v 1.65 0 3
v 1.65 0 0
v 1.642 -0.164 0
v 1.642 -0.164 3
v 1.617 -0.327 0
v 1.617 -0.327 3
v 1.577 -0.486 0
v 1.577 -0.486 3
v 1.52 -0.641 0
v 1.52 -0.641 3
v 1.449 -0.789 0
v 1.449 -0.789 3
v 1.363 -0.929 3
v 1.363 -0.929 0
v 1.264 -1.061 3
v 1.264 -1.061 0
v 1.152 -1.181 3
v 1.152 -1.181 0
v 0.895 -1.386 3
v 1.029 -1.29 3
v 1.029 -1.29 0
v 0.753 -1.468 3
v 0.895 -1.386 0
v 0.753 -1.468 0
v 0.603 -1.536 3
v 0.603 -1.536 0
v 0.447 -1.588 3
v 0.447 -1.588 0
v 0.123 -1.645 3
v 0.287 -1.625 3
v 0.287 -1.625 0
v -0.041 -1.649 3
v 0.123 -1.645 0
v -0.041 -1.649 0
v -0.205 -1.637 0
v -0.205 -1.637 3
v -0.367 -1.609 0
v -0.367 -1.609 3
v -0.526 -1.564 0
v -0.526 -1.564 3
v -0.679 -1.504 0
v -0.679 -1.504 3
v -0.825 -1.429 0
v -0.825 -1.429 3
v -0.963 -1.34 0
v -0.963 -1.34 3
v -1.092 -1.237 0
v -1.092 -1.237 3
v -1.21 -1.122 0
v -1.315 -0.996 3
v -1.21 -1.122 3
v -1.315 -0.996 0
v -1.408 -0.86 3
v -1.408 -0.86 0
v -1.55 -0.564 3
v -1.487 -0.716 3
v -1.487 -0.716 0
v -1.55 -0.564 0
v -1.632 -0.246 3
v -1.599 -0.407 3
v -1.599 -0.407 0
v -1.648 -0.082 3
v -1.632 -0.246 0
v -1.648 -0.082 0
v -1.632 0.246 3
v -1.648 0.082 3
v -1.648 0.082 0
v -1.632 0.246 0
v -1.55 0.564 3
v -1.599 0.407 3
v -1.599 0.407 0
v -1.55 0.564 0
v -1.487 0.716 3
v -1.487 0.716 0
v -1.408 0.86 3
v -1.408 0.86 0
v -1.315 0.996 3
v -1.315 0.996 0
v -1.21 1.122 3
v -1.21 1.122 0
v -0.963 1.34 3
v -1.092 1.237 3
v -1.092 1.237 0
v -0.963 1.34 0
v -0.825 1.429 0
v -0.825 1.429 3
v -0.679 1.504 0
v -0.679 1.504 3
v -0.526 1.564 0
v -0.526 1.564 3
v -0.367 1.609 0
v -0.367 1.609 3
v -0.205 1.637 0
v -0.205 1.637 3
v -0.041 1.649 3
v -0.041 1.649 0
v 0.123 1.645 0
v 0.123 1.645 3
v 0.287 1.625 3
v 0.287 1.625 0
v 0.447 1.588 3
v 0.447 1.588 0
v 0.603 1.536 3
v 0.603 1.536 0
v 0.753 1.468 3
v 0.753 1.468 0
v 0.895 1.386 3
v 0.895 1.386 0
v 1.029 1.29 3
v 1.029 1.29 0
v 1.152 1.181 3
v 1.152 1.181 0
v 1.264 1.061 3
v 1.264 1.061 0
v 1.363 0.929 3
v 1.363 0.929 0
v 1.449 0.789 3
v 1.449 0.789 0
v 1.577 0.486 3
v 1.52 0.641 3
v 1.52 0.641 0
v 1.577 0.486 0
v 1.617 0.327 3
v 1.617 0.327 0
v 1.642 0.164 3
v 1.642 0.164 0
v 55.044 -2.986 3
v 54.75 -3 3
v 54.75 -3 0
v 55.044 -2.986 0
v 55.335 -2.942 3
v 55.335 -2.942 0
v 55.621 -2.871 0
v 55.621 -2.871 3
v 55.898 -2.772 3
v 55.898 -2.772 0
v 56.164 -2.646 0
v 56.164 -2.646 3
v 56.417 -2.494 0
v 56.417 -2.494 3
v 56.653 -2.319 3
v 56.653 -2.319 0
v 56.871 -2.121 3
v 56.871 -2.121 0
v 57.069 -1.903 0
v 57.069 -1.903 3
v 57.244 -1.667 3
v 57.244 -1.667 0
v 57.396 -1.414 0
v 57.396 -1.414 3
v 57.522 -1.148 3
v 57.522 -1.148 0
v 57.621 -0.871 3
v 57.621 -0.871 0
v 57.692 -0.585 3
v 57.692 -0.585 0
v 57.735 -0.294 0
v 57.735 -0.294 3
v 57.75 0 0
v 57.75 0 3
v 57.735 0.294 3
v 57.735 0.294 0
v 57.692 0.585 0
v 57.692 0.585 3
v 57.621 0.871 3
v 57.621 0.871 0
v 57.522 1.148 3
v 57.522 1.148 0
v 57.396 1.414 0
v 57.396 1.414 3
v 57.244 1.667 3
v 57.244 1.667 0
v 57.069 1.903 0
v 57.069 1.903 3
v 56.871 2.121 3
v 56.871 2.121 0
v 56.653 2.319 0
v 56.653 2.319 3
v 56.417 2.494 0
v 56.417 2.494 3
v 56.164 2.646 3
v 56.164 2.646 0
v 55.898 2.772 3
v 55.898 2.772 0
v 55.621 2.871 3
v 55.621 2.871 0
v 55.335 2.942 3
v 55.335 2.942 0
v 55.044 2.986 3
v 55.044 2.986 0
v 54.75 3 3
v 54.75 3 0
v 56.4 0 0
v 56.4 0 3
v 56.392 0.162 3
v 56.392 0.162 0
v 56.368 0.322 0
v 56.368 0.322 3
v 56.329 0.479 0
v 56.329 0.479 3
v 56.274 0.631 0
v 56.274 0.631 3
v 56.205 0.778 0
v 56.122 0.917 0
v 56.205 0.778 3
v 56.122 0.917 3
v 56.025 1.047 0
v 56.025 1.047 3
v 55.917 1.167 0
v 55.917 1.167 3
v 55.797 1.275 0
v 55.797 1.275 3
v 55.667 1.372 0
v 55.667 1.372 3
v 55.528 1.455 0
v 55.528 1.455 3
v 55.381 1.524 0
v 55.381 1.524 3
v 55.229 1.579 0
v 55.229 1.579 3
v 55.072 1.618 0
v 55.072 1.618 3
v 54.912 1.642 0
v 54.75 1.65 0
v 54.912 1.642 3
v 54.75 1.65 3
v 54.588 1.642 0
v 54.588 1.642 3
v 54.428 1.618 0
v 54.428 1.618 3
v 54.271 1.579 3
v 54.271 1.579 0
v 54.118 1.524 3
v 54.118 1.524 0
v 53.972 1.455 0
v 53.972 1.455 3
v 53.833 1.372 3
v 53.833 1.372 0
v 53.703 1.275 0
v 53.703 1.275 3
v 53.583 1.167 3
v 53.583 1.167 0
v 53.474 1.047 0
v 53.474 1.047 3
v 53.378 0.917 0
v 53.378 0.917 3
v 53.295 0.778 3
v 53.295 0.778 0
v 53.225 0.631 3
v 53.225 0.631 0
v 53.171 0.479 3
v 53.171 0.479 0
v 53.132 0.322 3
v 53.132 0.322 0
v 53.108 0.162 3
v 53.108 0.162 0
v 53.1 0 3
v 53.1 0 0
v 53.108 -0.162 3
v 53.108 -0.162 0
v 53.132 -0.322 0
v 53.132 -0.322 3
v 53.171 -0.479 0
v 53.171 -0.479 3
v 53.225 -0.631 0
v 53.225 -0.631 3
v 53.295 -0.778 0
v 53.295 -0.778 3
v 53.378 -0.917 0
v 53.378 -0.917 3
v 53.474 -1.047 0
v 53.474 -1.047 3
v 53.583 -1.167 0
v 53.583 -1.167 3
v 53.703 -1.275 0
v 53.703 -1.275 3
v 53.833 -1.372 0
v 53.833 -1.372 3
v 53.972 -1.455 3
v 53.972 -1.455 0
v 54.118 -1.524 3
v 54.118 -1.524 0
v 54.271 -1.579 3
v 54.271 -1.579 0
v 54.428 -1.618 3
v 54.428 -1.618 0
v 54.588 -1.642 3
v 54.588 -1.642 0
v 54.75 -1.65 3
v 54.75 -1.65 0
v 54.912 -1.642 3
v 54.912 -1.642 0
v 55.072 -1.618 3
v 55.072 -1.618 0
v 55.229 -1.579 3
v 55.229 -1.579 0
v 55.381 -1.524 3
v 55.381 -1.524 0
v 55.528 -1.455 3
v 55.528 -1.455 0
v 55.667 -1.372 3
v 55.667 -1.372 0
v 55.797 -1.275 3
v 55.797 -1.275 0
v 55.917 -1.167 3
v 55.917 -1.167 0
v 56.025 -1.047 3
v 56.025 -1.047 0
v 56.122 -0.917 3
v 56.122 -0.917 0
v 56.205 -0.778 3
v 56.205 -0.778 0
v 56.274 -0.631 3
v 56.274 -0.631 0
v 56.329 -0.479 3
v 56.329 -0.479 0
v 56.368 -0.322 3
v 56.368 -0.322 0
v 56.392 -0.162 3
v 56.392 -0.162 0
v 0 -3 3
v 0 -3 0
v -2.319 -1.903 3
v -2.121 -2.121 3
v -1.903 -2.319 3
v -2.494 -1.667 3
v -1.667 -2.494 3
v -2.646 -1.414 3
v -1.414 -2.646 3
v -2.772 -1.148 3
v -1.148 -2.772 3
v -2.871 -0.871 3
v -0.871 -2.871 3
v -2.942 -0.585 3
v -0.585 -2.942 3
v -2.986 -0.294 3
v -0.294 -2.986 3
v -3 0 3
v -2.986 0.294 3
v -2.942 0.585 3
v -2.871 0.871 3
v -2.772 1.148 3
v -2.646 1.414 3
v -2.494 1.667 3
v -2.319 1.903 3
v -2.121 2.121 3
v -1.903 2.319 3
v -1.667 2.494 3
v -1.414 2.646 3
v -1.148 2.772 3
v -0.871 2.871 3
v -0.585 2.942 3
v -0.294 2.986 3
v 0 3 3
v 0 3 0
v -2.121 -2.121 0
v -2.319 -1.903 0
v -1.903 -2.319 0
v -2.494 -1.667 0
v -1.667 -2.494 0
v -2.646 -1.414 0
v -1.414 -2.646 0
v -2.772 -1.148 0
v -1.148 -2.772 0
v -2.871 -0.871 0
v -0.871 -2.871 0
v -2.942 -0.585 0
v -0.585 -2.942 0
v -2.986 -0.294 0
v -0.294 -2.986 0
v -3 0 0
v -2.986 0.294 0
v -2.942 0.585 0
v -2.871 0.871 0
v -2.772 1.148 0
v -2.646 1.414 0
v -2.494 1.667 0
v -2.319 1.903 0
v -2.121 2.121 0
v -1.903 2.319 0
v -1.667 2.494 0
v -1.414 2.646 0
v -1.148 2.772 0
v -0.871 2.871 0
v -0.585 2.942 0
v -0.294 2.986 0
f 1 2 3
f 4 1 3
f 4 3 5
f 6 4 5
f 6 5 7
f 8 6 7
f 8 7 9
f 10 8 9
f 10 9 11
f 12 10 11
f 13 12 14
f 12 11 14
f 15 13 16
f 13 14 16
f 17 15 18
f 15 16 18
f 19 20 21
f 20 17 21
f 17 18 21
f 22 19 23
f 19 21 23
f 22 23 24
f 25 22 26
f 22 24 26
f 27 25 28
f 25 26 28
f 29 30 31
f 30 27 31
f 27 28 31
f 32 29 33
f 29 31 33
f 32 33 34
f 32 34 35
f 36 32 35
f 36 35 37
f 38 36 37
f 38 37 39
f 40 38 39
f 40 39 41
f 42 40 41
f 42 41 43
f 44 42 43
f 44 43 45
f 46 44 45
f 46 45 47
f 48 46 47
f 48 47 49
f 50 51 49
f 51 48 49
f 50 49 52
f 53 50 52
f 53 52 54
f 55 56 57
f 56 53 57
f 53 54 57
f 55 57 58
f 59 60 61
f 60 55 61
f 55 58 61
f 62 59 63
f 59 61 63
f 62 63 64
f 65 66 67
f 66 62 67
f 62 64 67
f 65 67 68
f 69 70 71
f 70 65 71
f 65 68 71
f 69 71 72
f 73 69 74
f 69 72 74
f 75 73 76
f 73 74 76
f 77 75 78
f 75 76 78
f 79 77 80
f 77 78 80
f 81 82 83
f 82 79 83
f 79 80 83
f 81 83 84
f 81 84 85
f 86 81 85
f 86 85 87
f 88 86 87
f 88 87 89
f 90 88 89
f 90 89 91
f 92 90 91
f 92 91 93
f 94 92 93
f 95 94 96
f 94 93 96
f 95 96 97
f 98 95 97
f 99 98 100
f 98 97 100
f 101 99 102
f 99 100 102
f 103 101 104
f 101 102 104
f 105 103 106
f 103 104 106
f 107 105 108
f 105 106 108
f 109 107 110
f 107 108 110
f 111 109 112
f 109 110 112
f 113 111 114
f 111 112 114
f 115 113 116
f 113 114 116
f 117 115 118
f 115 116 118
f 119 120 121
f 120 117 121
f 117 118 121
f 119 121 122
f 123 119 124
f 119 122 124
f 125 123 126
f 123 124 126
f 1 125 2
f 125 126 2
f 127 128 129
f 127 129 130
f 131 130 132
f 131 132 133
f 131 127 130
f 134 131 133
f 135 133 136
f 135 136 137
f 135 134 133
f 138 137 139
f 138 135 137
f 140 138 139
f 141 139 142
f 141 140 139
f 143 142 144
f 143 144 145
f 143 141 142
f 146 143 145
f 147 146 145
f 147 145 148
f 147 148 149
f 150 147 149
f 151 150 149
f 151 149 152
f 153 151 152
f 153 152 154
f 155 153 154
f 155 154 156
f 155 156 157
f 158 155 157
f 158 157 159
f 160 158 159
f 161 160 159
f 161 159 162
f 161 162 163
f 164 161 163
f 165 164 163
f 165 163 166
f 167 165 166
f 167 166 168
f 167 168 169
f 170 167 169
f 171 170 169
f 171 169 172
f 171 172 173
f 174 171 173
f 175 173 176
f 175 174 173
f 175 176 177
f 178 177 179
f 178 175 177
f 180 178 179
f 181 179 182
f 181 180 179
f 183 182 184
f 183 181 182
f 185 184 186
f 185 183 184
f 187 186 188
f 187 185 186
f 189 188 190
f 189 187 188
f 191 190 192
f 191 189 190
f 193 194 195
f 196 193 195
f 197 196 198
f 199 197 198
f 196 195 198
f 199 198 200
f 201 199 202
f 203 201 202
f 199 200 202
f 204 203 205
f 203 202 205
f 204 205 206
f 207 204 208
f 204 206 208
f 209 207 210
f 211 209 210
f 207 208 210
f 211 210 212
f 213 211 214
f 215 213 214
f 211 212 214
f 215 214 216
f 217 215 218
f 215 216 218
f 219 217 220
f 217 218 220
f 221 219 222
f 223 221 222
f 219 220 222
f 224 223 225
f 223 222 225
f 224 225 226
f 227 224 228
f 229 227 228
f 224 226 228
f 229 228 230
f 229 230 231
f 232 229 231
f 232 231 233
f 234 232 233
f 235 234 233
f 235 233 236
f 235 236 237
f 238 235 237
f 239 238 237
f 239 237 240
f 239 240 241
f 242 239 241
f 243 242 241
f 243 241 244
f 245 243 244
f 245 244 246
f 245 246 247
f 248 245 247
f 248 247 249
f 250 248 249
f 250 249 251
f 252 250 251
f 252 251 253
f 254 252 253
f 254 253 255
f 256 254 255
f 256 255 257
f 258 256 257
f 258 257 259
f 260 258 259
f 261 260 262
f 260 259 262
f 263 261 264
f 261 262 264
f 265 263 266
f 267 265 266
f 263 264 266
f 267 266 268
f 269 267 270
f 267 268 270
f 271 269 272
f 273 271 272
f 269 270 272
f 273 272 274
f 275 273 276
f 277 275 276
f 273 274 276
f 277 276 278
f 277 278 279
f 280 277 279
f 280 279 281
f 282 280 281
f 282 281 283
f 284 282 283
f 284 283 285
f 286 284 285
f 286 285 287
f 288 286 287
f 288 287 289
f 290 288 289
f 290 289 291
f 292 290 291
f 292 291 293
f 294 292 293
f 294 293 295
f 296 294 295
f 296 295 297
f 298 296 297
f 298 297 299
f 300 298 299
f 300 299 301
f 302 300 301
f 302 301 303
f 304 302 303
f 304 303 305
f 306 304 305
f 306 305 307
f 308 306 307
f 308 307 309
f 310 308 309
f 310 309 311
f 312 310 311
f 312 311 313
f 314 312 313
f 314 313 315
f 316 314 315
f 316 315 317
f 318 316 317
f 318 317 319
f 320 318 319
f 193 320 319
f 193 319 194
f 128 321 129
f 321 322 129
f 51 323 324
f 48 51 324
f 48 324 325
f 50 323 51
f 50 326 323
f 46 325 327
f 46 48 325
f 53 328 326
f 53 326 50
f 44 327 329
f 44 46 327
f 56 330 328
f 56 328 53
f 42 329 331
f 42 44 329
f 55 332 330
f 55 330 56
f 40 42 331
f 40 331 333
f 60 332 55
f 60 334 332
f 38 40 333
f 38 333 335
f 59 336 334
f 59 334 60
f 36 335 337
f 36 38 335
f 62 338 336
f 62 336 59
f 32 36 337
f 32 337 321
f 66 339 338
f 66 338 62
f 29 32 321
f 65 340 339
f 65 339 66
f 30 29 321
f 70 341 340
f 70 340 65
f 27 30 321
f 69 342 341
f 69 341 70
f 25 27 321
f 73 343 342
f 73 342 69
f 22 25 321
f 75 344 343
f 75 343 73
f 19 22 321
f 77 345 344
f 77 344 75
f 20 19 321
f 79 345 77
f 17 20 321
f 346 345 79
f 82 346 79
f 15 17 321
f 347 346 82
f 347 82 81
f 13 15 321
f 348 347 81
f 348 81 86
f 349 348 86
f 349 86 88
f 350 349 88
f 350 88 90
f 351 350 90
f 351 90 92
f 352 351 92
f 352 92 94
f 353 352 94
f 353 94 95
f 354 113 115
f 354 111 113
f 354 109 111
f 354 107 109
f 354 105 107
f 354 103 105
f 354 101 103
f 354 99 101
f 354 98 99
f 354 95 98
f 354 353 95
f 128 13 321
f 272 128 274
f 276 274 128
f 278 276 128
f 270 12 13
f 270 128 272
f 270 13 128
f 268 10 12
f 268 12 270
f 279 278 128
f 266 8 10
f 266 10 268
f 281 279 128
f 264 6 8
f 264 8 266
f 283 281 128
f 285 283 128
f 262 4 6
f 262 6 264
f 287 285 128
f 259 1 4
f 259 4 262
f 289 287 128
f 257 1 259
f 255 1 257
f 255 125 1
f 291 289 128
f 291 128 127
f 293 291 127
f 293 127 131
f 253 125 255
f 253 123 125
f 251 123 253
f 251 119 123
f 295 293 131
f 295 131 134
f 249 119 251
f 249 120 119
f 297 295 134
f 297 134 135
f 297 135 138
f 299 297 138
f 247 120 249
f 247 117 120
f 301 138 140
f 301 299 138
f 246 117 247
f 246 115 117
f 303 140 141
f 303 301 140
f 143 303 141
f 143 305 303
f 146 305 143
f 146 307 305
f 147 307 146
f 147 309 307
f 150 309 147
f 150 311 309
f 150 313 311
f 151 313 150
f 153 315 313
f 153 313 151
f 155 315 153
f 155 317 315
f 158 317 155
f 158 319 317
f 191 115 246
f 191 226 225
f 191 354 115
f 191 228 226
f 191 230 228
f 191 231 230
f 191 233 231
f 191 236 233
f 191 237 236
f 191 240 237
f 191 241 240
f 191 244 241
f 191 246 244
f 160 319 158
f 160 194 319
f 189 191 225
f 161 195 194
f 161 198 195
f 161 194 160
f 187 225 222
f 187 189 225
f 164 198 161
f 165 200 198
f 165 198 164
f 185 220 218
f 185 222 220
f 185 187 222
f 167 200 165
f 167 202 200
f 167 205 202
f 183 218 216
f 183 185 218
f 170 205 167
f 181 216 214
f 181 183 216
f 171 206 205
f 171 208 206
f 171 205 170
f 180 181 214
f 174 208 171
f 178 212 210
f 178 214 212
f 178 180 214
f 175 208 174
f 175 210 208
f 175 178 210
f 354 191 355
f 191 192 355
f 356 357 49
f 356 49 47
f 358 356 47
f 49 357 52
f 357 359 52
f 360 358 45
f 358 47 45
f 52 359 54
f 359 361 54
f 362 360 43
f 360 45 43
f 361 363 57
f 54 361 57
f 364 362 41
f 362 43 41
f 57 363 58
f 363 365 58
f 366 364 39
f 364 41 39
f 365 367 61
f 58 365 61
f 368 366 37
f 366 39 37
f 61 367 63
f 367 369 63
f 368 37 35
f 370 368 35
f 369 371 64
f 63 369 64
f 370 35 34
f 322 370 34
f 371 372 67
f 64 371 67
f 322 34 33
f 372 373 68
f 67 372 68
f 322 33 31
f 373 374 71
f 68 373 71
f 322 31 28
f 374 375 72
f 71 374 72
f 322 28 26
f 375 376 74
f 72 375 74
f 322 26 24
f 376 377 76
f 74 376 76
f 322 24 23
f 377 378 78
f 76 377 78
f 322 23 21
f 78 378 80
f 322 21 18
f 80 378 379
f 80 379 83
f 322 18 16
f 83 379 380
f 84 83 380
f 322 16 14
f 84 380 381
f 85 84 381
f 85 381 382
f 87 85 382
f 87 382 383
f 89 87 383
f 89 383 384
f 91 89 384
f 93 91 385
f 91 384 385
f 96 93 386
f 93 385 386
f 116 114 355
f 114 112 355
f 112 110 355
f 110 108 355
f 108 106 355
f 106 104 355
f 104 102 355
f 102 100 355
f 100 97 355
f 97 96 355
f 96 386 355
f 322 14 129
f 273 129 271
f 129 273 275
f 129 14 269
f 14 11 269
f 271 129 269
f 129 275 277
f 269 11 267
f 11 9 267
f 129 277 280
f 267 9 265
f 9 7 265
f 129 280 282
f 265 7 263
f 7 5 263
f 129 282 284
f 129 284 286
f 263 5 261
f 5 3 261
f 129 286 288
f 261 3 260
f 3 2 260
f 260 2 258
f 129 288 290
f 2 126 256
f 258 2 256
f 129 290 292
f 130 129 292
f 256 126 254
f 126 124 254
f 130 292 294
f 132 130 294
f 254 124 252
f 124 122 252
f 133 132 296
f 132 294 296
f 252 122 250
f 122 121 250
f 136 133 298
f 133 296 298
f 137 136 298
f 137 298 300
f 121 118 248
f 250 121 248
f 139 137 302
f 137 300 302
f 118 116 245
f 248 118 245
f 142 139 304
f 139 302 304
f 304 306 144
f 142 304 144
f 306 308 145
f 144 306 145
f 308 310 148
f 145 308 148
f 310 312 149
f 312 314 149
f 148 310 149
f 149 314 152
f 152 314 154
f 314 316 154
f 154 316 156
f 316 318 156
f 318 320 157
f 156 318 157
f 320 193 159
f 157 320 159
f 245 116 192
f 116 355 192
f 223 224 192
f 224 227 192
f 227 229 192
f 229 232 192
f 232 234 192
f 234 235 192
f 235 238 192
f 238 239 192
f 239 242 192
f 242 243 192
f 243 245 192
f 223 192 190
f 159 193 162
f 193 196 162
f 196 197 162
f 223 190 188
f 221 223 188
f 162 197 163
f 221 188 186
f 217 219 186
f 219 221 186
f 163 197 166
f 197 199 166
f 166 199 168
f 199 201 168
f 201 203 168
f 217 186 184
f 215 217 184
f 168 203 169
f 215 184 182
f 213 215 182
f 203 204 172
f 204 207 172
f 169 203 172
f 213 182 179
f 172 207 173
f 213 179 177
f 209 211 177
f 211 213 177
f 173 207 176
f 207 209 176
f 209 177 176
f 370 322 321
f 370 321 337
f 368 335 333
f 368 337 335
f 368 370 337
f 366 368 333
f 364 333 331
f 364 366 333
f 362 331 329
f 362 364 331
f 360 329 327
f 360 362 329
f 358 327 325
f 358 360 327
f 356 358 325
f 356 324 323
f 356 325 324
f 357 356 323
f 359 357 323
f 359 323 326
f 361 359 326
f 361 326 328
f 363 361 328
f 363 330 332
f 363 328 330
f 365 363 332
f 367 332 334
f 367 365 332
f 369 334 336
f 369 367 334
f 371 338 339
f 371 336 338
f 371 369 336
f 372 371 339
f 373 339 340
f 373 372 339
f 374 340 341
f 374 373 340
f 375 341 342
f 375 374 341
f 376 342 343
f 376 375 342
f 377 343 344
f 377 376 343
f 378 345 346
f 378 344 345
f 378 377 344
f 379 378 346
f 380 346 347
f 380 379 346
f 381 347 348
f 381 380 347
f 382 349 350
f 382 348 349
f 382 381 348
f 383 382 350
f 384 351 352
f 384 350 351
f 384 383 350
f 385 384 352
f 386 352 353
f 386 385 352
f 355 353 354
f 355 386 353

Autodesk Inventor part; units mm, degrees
ref_plane "YZ Plane" through (0, 0, 0) normal (1, 0, 0) x (0, 1, 0)
ref_plane "XZ Plane" through (0, 0, 0) normal (0, 1, 0) x (-1, 0, 0)
ref_plane "XY Plane" through (0, 0, 0) normal (0, 0, 1) x (1, 0, 0)
sketch "Sketch1" plane through (0, 0, 0) normal (0, 0, 1) x (1, 0, 0)
  line L0 (0, 0) -> (24, 0)
  circle A0 centre (0, 0) radius 1.6
  line L1 (0, 0) -> (24, 0) construction
  line L2 (0, -3) -> (24, -3)
  line L3 (24, 3) -> (0, 3)
  arc A1 (0, 3) -> (0, -3) centre (0, 0) ccw
  line L4 (24, 0) -> (28, 0)
  circle A2 centre (27, 0) radius 1.6
  line L5 (27, 0) -> (0, 0) construction
  line L6 (27, 3) -> (0, 3)
  line L7 (0, -3) -> (27, -3)
  arc A3 (27, -3) -> (27, 3) centre (27, 0) ccw
  arc A4 (0, 3) -> (0, -3) centre (0, 0) ccw
  point P0 (12, 0)
  point P1 (13.5, 0)
  dimension "d0" = 24
  dimension "d1" = 3.2
  dimension "d6" = 4
  dimension "d7" = 3.2
  dimension "d8" = 6
extrude "Extrusion1" [suppressed]
sketch "Sketch2" plane through (0, 0, 0) normal (0, 0, 1) x (1, 0, 0)
  line L0 (0, 0) -> (28, 0)
  circle A0 centre (0, 0) radius 1.65
  circle A1 centre (28, 0) radius 1.65
  line L1 (0, 0) -> (28, 0) construction
  line L2 (0, -3) -> (28, -3)
  line L3 (28, 3) -> (0, 3)
  arc A2 (0, 3) -> (0, -3) centre (0, 0) ccw
  arc A3 (28, -3) -> (28, 3) centre (28, 0) ccw
  point P0 (14, 0)
  dimension "d9" = 28
  dimension "d10" = 3.3
  dimension "d11" = 3.3
  dimension "d12" = 6
extrude "Extrusion2" add sketch "Sketch2" along normal blind 3
sketch "Sketch3" plane through (0, 0, 3) normal (0, 0, 1) x (1, 0, 0)
  circle A0 centre (28, 0) radius 1.65 projected
  line L0 (28, 0) -> (43, 0)
  line L1 (28, 0) -> (43, 0) construction
  line L2 (28, -3) -> (43, -3)
  line L3 (43, 3) -> (28, 3)
  arc A1 (28, 3) -> (28, -3) centre (28, 0) ccw
  arc A2 (43, -3) -> (43, 3) centre (43, 0) ccw
  circle A3 centre (43, 0) radius 1.65
  point P0 (0, 0)
  point P1 (35.5, 0)
  dimension "d15" = 15
  dimension "d16" = 6
extrude "Extrusion3" add sketch "Sketch3" against normal blind 3 contours A0 | A1 L3 A2 L2
sketch "Sketch4" plane through (0, 0, 3) normal (0, 0, 1) x (1, 0, 0)
  line L0 (38.0198, 0) -> (46.7499, 0)
  circle A0 centre (46.7499, 0) radius 1.65
  line L1 (0, 0) -> (46.7499, 0) construction
  line L2 (0, -3) -> (46.7499, -3)
  line L3 (46.7499, 3) -> (0, 3)
  arc A1 (0, 3) -> (0, -3) centre (0, 0) ccw
  arc A2 (46.7499, -3) -> (46.7499, 3) centre (46.7499, 0) ccw
  line L4 (39.9731, -3) -> (39.9731, 3)
  point P0 (23.375, 0)
  dimension "d19" = 3.3
  dimension "d20" = 6
extrude "Extrusion4" add sketch "Sketch4" against normal blind 3 contours L4 L3 A2 L2
extrude "Extrusion5" cut sketch "Sketch4" against normal blind 3 contours A0
sketch "Sketch5" plane through (0, 0, 3) normal (0, 0, 1) x (1, 0, 0)
  arc A0 (46.7499, -3) -> (46.7499, 3) centre (46.7499, 0) ccw projected
  line L0 (46.7499, 0) -> (54.7499, 0)
  circle A1 centre (54.7499, 0) radius 1.65
  line L1 (33.9937, 0) -> (54.7499, 0) construction
  line L2 (33.9937, 3) -> (54.7499, 3)
  line L3 (54.7499, -3) -> (33.9937, -3)
  arc A2 (33.9937, 3) -> (33.9937, -3) centre (33.9937, 0) ccw
  arc A3 (54.7499, -3) -> (54.7499, 3) centre (54.7499, 0) ccw
  point P0 (0, 0)
  point P1 (44.3718, 0)
  dimension "d25" = 8
  dimension "d26" = 3.3
extrude "Extrusion6" add sketch "Sketch5" against normal blind 3
properties part number "connector"
